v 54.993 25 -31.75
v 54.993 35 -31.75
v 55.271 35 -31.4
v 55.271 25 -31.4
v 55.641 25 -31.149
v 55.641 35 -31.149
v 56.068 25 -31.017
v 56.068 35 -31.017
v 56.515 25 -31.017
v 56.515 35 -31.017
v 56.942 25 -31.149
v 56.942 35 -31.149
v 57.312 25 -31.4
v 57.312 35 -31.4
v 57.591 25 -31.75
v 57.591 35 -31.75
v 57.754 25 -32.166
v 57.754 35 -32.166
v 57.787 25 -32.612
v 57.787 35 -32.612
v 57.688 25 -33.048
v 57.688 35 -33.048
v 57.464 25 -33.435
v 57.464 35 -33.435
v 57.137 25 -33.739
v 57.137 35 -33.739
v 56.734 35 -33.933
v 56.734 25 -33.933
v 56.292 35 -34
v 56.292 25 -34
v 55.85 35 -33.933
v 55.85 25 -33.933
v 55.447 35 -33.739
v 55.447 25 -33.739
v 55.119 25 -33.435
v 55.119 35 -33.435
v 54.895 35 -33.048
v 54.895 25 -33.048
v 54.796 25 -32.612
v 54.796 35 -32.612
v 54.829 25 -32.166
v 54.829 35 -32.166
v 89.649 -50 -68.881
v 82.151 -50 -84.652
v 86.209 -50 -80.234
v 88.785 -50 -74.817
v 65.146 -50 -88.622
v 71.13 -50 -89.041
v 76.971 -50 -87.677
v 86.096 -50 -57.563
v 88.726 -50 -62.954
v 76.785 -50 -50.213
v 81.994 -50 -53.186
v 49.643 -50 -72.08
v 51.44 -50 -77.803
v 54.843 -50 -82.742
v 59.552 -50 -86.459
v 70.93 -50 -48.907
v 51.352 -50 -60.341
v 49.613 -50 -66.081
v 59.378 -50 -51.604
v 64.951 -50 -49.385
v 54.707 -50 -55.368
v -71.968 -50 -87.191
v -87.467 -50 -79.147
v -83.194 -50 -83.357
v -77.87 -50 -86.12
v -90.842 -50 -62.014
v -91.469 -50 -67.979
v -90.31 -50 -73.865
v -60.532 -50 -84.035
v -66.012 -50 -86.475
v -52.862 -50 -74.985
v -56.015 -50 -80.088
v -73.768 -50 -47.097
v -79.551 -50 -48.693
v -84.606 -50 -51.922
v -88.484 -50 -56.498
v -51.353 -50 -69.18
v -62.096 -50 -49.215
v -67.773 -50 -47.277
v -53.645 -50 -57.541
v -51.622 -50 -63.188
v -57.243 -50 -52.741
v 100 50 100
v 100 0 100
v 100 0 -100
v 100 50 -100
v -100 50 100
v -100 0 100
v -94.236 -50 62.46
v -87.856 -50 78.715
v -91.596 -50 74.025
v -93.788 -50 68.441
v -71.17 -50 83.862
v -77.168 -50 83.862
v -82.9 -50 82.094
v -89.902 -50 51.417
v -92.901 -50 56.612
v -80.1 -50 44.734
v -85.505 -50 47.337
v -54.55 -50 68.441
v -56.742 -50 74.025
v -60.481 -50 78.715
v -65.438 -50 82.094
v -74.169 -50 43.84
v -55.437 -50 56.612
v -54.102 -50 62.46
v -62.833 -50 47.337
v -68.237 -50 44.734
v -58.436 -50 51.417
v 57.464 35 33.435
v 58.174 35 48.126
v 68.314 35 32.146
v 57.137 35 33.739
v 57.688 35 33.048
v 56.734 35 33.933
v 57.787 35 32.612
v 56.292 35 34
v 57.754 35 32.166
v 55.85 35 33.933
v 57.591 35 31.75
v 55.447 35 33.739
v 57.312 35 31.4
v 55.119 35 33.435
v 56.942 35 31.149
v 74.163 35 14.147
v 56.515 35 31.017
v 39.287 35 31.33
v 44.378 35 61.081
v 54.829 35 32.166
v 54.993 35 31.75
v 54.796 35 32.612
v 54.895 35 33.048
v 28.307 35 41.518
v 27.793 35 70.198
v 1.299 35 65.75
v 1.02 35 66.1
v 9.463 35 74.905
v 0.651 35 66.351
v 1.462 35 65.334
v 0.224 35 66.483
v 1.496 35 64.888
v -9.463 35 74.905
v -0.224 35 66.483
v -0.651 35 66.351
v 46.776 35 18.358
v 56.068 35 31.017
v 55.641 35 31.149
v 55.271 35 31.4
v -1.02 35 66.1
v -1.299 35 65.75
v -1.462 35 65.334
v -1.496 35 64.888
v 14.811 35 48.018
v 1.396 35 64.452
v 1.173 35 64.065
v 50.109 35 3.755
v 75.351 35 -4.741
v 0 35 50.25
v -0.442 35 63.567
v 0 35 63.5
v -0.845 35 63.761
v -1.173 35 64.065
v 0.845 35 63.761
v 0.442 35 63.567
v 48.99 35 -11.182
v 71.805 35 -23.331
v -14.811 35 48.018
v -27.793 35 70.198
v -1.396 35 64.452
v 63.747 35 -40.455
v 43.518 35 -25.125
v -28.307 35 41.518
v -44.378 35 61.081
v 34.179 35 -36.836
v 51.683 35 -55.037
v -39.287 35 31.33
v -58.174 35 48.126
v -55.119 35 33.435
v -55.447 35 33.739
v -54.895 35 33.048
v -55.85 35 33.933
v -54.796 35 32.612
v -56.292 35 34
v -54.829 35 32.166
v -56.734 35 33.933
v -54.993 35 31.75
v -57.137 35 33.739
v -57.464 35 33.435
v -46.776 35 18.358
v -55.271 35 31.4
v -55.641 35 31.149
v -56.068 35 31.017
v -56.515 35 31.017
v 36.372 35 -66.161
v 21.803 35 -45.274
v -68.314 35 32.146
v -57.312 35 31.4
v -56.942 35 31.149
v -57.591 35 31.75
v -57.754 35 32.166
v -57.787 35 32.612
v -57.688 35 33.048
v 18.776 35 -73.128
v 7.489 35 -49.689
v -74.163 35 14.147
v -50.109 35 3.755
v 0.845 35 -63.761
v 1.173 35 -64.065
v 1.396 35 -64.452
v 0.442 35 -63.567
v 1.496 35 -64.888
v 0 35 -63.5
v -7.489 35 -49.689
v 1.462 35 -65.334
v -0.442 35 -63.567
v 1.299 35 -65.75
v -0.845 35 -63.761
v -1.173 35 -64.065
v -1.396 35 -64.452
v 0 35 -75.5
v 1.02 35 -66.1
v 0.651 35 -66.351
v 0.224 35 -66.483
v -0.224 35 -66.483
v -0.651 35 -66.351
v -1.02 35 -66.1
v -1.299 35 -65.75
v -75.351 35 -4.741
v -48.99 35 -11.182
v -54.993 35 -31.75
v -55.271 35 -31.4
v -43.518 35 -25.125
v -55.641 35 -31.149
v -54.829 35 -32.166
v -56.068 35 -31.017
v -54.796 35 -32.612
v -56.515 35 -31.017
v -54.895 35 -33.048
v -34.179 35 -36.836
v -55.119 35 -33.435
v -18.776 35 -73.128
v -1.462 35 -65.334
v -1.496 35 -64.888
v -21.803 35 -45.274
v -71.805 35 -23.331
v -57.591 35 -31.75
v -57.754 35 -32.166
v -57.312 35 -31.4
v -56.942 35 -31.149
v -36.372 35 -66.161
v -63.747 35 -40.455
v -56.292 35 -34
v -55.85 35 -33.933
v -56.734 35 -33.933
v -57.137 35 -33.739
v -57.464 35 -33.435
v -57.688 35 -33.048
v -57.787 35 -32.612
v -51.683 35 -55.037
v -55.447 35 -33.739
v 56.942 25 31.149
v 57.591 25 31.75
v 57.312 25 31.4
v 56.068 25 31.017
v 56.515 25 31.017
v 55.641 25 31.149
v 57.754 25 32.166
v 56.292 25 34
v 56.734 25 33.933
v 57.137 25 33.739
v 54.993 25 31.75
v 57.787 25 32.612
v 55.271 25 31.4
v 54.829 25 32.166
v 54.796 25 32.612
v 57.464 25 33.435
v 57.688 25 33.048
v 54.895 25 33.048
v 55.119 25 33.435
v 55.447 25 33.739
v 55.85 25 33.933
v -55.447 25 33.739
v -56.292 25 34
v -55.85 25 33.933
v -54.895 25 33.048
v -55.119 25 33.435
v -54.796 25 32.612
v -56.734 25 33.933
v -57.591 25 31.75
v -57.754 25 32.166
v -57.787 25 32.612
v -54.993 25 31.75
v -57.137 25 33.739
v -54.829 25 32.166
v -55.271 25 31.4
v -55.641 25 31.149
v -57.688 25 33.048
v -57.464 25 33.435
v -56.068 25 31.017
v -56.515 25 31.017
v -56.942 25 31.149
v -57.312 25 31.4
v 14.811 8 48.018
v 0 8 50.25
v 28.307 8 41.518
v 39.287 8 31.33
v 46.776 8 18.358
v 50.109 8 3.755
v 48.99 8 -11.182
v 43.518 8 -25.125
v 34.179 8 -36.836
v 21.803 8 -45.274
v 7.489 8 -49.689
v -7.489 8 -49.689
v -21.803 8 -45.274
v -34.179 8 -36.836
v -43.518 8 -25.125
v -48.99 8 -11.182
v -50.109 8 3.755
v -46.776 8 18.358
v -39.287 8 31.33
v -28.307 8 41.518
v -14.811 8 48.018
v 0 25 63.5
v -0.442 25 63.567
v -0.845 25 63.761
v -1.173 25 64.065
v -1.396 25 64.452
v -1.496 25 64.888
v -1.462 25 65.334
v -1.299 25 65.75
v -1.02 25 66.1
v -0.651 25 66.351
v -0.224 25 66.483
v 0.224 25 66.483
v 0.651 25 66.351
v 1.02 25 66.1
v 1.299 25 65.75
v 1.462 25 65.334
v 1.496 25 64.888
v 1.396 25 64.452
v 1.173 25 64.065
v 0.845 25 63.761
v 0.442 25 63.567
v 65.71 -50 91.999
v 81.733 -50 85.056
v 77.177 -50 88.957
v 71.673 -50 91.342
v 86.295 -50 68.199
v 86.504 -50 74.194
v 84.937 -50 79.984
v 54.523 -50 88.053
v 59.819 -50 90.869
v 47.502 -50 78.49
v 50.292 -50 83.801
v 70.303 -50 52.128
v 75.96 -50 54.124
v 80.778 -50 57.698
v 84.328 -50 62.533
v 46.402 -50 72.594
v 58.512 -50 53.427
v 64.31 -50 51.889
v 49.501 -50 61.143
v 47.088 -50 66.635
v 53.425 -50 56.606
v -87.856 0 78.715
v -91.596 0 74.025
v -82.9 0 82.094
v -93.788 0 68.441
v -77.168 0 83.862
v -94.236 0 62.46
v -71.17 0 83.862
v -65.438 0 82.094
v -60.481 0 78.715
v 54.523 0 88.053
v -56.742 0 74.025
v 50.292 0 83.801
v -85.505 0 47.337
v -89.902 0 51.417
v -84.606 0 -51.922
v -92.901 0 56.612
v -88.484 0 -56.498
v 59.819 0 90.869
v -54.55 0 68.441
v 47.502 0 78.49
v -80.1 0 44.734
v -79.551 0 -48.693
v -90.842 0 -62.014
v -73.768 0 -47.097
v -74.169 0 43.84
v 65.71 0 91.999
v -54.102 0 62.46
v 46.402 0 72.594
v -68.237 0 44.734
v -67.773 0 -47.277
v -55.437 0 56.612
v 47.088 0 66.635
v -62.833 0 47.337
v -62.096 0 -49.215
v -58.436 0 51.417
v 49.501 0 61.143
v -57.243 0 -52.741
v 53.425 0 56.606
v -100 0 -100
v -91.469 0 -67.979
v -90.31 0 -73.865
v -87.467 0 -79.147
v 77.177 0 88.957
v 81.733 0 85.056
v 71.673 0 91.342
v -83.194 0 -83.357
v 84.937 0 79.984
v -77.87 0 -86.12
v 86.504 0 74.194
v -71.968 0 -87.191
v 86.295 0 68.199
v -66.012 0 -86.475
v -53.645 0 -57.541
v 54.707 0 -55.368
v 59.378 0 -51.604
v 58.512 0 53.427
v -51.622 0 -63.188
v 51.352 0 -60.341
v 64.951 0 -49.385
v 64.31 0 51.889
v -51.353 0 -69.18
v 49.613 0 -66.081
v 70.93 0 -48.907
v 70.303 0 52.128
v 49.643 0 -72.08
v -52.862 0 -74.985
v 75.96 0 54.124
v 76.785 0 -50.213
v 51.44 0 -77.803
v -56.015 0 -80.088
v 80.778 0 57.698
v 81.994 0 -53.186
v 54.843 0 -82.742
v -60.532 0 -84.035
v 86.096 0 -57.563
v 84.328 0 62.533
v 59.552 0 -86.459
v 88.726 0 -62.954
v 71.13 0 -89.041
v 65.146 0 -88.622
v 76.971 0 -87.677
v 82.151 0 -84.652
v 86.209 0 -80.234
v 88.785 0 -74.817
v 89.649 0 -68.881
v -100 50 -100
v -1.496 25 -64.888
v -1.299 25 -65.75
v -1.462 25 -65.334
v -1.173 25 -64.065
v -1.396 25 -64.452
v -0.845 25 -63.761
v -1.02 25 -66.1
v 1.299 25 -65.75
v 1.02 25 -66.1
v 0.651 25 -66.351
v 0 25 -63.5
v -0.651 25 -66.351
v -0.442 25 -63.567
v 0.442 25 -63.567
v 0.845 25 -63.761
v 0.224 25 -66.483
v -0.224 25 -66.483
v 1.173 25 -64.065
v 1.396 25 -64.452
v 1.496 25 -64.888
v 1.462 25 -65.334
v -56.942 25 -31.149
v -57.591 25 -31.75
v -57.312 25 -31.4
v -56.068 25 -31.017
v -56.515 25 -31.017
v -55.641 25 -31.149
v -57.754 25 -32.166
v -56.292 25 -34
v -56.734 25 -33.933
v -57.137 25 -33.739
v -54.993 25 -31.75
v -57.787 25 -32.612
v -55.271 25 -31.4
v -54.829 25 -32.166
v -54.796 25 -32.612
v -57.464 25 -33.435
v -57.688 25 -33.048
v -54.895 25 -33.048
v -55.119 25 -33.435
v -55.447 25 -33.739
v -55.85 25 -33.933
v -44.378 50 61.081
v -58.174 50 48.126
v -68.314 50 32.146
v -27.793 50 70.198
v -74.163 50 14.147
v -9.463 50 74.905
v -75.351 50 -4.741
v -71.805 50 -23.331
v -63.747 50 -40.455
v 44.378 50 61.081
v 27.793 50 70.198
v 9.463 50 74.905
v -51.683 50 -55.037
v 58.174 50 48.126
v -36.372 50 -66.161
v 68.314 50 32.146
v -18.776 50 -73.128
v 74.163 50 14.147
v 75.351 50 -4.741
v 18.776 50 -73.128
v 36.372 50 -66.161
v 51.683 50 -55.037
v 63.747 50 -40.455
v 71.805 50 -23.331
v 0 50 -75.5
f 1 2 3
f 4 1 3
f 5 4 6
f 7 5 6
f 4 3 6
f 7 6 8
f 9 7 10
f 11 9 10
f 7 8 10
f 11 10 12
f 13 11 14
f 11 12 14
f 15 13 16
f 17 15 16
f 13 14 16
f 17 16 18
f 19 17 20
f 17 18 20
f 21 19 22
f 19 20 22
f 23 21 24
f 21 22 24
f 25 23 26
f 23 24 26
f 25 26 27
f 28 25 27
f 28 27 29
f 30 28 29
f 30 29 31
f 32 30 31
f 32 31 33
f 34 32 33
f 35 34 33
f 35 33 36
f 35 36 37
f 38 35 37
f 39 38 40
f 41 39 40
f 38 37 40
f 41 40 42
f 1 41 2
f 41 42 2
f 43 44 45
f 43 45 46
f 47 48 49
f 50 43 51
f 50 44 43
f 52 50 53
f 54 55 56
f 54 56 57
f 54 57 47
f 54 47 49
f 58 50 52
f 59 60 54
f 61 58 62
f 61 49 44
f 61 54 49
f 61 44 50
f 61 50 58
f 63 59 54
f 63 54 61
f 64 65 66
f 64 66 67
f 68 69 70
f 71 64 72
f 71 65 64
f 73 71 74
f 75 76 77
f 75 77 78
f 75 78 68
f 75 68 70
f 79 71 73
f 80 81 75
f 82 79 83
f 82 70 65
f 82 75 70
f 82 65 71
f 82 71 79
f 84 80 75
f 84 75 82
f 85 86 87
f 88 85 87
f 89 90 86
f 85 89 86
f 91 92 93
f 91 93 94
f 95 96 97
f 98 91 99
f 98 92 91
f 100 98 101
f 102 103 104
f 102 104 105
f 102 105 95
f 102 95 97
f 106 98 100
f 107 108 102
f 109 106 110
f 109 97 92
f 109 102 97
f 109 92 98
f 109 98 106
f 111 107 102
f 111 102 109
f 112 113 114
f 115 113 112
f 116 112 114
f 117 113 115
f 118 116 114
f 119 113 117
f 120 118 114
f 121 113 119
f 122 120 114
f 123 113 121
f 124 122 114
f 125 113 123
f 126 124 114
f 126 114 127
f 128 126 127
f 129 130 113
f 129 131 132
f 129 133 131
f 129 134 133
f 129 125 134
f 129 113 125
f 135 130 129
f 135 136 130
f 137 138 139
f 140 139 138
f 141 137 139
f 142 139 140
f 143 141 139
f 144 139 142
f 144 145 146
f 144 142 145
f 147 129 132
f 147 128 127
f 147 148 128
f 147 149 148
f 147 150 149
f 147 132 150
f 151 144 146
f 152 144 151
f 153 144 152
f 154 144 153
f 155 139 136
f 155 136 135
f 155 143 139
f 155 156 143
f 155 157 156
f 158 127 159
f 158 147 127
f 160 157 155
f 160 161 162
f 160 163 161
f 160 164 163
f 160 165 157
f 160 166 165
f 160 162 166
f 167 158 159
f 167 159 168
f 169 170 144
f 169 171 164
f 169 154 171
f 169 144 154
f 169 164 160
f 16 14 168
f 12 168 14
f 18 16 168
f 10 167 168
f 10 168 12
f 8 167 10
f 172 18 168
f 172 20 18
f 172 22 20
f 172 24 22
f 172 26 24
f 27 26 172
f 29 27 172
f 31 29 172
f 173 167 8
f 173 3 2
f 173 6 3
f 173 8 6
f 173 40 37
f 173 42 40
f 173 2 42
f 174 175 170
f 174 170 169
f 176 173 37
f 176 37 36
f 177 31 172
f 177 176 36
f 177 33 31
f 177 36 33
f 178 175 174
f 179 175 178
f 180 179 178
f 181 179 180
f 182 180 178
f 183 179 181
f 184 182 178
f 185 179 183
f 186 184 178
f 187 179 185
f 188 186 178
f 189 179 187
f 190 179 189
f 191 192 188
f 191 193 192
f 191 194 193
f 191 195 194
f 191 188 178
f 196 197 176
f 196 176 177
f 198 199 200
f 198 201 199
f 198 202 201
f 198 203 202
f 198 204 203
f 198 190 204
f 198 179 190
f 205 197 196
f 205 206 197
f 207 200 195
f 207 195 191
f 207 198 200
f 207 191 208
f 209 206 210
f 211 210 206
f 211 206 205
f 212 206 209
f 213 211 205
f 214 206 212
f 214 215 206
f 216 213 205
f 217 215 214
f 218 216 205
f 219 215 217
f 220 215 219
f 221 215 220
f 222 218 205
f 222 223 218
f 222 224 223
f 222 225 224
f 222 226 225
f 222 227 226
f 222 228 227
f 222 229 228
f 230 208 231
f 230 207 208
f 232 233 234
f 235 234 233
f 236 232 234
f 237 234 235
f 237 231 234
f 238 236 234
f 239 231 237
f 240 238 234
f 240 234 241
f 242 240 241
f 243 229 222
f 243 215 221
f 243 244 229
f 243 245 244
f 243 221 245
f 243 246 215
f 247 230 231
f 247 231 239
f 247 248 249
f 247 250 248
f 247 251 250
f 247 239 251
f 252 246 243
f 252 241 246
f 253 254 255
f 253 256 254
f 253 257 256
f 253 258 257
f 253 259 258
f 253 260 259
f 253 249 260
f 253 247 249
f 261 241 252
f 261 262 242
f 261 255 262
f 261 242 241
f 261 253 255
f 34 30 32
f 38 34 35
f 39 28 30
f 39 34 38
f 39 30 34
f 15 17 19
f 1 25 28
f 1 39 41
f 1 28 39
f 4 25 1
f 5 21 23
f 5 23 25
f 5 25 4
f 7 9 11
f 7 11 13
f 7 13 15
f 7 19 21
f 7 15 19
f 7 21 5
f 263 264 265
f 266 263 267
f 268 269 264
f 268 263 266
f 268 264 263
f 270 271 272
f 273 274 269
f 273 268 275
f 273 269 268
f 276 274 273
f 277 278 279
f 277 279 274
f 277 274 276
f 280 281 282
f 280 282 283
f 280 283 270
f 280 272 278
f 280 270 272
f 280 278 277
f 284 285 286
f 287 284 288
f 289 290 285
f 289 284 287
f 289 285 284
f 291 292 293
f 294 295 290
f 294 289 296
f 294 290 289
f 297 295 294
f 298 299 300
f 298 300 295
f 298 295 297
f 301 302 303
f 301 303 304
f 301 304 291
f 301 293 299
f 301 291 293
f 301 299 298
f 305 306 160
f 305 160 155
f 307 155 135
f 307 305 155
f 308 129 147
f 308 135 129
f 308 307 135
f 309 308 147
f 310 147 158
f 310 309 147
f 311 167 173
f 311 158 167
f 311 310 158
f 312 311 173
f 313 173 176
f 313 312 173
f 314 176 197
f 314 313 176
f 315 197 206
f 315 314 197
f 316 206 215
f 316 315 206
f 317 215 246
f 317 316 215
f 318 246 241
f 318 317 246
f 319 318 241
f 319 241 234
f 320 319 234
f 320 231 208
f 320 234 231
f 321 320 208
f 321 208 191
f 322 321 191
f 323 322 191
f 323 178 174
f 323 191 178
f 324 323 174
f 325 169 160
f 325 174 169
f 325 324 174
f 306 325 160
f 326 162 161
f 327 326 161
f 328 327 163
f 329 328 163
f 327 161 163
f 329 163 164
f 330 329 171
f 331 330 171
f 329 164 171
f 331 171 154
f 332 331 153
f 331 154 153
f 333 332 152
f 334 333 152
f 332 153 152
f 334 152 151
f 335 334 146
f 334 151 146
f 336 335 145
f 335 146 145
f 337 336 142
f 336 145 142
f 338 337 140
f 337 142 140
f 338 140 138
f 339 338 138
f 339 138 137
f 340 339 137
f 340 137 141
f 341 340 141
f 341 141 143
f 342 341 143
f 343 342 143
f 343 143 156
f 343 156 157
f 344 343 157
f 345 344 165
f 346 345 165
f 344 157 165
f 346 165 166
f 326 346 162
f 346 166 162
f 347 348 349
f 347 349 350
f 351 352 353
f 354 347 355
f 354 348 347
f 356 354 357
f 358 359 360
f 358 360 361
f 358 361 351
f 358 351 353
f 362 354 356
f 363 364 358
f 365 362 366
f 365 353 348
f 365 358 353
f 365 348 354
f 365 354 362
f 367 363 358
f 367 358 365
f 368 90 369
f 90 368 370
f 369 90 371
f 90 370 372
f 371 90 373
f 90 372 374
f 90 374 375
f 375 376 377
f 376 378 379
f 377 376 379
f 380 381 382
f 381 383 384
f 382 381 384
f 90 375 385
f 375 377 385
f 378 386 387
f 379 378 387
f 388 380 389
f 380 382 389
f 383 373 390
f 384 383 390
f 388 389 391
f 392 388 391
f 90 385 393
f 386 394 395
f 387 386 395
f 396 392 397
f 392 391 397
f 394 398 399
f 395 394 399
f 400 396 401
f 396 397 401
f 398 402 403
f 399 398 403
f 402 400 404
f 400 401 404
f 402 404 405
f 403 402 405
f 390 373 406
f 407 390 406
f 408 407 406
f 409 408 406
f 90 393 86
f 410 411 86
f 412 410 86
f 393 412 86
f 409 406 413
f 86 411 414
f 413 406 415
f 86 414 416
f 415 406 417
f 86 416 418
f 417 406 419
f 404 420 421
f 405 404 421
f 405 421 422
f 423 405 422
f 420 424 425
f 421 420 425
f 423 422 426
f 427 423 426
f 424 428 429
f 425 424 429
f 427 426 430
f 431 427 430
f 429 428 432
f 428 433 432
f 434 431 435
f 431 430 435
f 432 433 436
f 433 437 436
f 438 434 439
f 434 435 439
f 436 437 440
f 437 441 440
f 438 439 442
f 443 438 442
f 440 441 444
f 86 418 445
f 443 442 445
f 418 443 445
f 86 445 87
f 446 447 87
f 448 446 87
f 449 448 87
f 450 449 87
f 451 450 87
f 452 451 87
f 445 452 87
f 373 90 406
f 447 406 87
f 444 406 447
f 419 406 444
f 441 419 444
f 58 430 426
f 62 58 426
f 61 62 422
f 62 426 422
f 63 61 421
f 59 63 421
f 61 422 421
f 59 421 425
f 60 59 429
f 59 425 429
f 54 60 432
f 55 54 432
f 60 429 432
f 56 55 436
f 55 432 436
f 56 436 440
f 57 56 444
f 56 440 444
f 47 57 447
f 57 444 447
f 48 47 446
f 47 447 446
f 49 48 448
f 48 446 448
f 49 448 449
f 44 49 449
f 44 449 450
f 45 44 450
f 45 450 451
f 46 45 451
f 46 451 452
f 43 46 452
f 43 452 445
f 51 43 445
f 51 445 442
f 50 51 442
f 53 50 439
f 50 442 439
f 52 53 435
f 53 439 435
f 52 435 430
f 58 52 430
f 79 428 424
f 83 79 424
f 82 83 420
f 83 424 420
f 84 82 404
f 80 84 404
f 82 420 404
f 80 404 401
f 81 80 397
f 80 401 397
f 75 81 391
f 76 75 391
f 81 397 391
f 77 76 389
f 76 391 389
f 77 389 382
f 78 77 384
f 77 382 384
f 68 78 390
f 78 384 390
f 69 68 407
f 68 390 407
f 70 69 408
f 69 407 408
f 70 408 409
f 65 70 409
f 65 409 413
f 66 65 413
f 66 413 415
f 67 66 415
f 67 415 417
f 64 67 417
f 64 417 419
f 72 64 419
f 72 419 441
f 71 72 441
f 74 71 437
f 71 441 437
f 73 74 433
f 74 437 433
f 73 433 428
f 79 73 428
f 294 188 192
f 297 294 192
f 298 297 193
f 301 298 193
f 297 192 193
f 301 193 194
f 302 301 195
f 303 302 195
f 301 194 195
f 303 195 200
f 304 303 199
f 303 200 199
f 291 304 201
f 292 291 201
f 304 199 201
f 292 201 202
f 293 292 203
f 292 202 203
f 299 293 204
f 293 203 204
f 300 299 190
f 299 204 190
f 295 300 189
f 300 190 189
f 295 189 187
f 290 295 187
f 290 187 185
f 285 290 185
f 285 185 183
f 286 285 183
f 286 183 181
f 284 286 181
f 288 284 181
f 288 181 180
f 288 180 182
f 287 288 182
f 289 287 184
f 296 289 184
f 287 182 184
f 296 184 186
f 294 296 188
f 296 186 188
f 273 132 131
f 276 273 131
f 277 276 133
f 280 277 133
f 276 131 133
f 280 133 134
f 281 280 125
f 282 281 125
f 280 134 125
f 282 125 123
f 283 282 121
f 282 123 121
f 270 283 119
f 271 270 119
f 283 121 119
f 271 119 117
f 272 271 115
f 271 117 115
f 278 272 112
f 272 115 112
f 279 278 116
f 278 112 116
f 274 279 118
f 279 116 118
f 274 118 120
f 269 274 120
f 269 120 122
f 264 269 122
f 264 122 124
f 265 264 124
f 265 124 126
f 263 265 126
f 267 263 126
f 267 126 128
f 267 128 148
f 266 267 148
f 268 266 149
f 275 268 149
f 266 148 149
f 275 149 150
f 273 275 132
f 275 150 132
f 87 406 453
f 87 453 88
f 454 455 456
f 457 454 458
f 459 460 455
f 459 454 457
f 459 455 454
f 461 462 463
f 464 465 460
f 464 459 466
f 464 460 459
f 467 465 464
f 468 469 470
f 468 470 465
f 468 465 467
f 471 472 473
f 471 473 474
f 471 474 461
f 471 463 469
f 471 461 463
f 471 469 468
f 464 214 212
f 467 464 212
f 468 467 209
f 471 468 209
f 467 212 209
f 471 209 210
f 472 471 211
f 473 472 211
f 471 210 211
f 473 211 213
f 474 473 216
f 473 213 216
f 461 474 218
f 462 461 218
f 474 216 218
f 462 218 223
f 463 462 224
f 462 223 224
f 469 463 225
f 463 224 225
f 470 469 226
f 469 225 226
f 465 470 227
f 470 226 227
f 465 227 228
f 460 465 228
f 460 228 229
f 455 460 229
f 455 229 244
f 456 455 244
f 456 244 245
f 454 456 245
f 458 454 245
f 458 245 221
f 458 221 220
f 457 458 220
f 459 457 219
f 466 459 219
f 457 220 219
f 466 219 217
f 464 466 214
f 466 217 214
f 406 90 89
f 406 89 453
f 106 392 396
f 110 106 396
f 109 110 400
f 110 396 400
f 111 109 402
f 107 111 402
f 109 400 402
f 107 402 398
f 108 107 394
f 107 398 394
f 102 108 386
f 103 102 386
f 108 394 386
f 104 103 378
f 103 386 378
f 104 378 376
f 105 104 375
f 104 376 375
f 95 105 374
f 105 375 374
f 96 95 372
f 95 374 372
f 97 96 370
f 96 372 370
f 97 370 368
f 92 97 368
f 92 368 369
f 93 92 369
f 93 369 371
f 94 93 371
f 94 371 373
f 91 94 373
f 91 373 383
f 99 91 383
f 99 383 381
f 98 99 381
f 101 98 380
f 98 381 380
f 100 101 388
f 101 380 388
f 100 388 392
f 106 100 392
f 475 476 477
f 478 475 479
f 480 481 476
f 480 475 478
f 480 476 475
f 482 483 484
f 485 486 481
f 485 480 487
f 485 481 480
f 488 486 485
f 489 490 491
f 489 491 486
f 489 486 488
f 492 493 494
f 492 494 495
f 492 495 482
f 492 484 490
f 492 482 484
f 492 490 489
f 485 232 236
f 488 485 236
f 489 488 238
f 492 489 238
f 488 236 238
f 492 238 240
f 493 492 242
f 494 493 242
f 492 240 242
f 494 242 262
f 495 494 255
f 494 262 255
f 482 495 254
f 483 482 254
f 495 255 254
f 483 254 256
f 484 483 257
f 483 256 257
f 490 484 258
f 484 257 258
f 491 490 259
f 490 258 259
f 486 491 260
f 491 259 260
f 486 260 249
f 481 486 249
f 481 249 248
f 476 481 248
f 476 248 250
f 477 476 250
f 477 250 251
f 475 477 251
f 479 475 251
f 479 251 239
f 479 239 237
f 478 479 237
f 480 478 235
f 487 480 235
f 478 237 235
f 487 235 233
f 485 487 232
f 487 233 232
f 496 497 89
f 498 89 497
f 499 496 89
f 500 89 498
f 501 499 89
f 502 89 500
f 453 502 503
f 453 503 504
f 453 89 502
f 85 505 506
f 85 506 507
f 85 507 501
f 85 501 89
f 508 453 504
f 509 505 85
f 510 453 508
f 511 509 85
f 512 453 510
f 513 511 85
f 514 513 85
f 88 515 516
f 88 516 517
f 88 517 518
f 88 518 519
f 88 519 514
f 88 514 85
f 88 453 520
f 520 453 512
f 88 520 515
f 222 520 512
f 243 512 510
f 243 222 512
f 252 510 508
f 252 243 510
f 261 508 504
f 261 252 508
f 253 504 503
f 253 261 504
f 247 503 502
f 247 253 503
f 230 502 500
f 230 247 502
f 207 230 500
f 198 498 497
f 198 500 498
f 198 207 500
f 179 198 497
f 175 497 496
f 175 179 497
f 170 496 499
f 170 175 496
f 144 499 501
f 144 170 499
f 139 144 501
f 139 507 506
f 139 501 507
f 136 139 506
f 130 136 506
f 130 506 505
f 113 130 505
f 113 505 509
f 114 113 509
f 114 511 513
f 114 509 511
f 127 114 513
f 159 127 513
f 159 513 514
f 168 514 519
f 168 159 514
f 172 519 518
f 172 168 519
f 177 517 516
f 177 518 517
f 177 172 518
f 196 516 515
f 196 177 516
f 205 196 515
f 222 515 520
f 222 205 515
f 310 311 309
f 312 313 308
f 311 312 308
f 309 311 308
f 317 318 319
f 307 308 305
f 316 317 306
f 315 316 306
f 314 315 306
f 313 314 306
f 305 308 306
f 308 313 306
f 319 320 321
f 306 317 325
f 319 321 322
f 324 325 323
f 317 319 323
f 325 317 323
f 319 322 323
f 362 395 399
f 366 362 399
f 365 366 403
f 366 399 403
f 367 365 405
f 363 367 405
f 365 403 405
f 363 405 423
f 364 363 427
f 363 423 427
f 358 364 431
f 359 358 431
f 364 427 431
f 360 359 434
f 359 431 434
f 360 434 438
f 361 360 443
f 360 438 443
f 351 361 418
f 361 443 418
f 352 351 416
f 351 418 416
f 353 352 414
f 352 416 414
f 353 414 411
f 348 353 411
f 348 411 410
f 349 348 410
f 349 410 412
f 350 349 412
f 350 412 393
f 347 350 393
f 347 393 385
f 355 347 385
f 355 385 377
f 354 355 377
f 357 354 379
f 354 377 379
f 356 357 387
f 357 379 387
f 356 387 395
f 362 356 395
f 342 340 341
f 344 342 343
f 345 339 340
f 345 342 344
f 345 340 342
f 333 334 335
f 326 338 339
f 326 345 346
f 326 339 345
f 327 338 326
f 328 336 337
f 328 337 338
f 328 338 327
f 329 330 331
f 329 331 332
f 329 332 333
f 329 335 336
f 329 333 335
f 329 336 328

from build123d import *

# Parameters (mm, degrees)
SKETCH2_W               = 200
SKETCH2_H               = 200
BOSS_EXTRUDE1_DEPTH     = 50
CUT_EXTRUDE1_DEPTH      = 151
CUT_EXTRUDE1_DEPTH_BACK = 15
SKETCH5_R               = 75.5
CUT_EXTRUDE2_DEPTH      = 146.688022843
CUT_EXTRUDE2_DEPTH_BACK = 146.688022843
SKETCH7_R               = 50.25
SKETCH12_R              = 20.123320675
BOSS_EXTRUDE2_DEPTH     = 50
CIRPATTERN1_COUNT       = 4
CIRPATTERN1_ANGLE       = 276
SKETCH13_R              = 1.5
CUT_EXTRUDE3_DEPTH      = 10
CIRPATTERN2_COUNT       = 6
BOSS_EXTRUDE3_START     = -8
SKETCH14_R              = 50.25
BOSS_EXTRUDE3_DEPTH     = 8


with BuildPart() as part:
    # Sketch2 → Boss-Extrude1 (new body)
    with BuildSketch(Plane(origin=(0, 0, 0), x_dir=(1, 0, 0), z_dir=(0, 1, 0))):
        Rectangle(SKETCH2_W, SKETCH2_H)
    extrude(amount=BOSS_EXTRUDE1_DEPTH)

    # Sketch5 → Cut-Extrude1 (cut, two sides: drawn at the far end of the back side and taken through both)
    with BuildSketch(Plane(origin=(0, 50, 0), x_dir=(1, 0, 0), z_dir=(0, 1, 0)).offset(-CUT_EXTRUDE1_DEPTH_BACK)):
        with Locations(Location((0, 0, 0), (0, 0, 90))):
            Circle(SKETCH5_R)
    extrude(amount=CUT_EXTRUDE1_DEPTH + CUT_EXTRUDE1_DEPTH_BACK, mode=Mode.SUBTRACT)

    # Sketch7 → Cut-Extrude2 (cut, two sides: drawn at the far end of the back side and taken through both)
    with BuildSketch(Plane(origin=(0, 35, 0), x_dir=(1, 0, 0), z_dir=(0, 1, 0)).offset(-CUT_EXTRUDE2_DEPTH_BACK)):
        with Locations(Location((0, 0, 0), (0, 0, 270))):
            Circle(SKETCH7_R)
    extrude(amount=CUT_EXTRUDE2_DEPTH + CUT_EXTRUDE2_DEPTH_BACK, mode=Mode.SUBTRACT)

    # Sketch12 → Boss-Extrude2 (add)
    with BuildSketch(Plane.XZ):
        with Locations(Location((-74.168810486, 63.963412144, 0), (0, 0, 270))):
            Circle(SKETCH12_R)
    boss_extrude2 = extrude(amount=BOSS_EXTRUDE2_DEPTH)

    # CirPattern1: Boss-Extrude2 ×4 about axis
    cirpattern1_axis = Axis((0, 0, 0), (0, 1, 0))
    for i in range(1, CIRPATTERN1_COUNT):
        add(boss_extrude2.rotate(cirpattern1_axis, i * CIRPATTERN1_ANGLE / (CIRPATTERN1_COUNT - 1)))

    # Sketch13 → Cut-Extrude3 (cut)
    with BuildSketch(Plane(origin=(0, 35, 0), x_dir=(1, 0, 0), z_dir=(0, 1, 0))):
        with Locations(Location((0, 65, 0), (0, 0, 270))):
            Circle(SKETCH13_R)
    cut_extrude3 = extrude(amount=-CUT_EXTRUDE3_DEPTH, mode=Mode.SUBTRACT)

    # CirPattern2: Cut-Extrude3 ×6 about axis
    cirpattern2_axis = Axis((0, 0, 0), (0, 1, 0))
    for i in range(1, CIRPATTERN2_COUNT):
        add(cut_extrude3.rotate(cirpattern2_axis, i * 360 / CIRPATTERN2_COUNT), mode=Mode.SUBTRACT)

    # Sketch14 → Boss-Extrude3 (add)
    with BuildSketch(Plane.XZ.offset(BOSS_EXTRUDE3_START)):
        with Locations(Location((0, 0, 0), (0, 0, 90))):
            Circle(SKETCH14_R)
    extrude(amount=BOSS_EXTRUDE3_DEPTH)


solid = part.part
